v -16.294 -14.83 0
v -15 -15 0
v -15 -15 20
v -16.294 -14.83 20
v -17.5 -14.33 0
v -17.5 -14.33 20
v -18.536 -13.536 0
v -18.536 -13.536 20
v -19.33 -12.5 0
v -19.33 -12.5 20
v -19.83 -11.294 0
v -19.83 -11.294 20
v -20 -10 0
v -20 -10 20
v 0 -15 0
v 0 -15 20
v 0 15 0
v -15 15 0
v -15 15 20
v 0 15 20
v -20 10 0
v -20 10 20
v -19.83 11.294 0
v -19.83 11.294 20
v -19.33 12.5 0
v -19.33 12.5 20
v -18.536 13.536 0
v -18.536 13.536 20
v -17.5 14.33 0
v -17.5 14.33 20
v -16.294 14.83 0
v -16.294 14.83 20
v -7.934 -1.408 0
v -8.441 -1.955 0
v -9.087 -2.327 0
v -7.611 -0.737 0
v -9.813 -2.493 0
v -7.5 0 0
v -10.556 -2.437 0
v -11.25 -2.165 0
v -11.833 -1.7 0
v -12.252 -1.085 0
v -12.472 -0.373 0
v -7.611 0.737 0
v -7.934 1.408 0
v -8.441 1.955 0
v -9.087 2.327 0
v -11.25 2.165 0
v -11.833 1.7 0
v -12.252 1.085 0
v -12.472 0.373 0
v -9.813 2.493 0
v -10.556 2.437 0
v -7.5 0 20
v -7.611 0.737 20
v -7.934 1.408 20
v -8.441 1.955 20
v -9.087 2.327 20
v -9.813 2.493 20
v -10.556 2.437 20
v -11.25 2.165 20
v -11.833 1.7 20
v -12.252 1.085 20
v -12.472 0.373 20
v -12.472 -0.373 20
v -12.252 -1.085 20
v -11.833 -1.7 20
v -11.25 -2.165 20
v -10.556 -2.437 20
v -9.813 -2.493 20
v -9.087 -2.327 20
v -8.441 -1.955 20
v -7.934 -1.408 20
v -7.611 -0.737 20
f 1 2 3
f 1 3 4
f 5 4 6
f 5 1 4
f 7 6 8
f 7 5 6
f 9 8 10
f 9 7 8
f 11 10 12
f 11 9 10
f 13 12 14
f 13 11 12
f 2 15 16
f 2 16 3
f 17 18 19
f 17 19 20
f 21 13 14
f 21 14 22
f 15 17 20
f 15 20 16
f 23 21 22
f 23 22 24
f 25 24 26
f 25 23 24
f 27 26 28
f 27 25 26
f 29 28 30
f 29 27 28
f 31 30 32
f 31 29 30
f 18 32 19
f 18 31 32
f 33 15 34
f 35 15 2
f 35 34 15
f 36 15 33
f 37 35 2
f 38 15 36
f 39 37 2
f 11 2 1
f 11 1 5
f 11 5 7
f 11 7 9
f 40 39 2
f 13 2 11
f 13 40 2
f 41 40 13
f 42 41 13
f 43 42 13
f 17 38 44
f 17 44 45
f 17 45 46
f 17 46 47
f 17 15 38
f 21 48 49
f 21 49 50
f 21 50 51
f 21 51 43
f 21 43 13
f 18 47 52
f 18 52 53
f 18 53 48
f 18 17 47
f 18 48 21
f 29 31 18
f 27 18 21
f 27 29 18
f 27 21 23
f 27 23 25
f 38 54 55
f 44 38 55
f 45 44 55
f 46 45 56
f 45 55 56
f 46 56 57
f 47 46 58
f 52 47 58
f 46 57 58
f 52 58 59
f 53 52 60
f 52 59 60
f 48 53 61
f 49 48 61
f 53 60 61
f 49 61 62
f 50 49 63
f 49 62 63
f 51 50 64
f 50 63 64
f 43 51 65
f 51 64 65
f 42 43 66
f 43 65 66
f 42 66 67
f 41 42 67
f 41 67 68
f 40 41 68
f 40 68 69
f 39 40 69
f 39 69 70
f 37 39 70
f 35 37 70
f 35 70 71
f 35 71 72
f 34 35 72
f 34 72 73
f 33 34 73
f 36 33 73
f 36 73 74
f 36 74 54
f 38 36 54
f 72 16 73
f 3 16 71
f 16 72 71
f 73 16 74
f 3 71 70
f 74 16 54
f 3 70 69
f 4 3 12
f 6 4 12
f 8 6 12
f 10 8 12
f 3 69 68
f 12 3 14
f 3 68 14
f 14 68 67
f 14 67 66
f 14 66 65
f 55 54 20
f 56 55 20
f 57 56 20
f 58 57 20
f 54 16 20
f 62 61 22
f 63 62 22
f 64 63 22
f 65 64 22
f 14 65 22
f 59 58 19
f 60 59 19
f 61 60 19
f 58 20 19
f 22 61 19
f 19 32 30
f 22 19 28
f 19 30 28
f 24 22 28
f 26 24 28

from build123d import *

# Parameters (mm, degrees)
BOSS_EXTRUDE1_DEPTH     = 20
CUT_EXTRUDE1_DEPTH      = 1
CUT_EXTRUDE1_DEPTH_BACK = 21


with BuildPart() as part:
    # Sketch1 → Boss-Extrude1 (new body)
    with BuildSketch(Plane.XY):
        with BuildLine():
            Line((-15, 15), (0, 15))
            Line((0, 15), (0, -15))
            Line((0, -15), (-15, -15))
            ThreePointArc((-15, -15), (-18.535533906, -13.535533906), (-20, -10))
            Line((-20, -10), (-20, 10))
            ThreePointArc((-20, 10), (-18.535533906, 13.535533906), (-15, 15))
        make_face()
    extrude(amount=BOSS_EXTRUDE1_DEPTH)

    # Sketch2 → Cut-Extrude1 (cut, two sides)
    with BuildSketch(Plane.XY.offset(20)) as cut_extrude1_sk:
        with BuildLine():
            ThreePointArc((-12.5, 0), (-10, -2.5), (-7.5, 0))
            Line((-7.5, 0), (-12.5, 0))
        make_face()
        with BuildLine():
            Line((-12.5, 0), (-7.5, 0))
            ThreePointArc((-7.5, 0), (-10, 2.5), (-12.5, 0))
        make_face()
    extrude(amount=CUT_EXTRUDE1_DEPTH, mode=Mode.SUBTRACT)
    extrude(cut_extrude1_sk.sketch, amount=-CUT_EXTRUDE1_DEPTH_BACK, mode=Mode.SUBTRACT)


solid = part.part
